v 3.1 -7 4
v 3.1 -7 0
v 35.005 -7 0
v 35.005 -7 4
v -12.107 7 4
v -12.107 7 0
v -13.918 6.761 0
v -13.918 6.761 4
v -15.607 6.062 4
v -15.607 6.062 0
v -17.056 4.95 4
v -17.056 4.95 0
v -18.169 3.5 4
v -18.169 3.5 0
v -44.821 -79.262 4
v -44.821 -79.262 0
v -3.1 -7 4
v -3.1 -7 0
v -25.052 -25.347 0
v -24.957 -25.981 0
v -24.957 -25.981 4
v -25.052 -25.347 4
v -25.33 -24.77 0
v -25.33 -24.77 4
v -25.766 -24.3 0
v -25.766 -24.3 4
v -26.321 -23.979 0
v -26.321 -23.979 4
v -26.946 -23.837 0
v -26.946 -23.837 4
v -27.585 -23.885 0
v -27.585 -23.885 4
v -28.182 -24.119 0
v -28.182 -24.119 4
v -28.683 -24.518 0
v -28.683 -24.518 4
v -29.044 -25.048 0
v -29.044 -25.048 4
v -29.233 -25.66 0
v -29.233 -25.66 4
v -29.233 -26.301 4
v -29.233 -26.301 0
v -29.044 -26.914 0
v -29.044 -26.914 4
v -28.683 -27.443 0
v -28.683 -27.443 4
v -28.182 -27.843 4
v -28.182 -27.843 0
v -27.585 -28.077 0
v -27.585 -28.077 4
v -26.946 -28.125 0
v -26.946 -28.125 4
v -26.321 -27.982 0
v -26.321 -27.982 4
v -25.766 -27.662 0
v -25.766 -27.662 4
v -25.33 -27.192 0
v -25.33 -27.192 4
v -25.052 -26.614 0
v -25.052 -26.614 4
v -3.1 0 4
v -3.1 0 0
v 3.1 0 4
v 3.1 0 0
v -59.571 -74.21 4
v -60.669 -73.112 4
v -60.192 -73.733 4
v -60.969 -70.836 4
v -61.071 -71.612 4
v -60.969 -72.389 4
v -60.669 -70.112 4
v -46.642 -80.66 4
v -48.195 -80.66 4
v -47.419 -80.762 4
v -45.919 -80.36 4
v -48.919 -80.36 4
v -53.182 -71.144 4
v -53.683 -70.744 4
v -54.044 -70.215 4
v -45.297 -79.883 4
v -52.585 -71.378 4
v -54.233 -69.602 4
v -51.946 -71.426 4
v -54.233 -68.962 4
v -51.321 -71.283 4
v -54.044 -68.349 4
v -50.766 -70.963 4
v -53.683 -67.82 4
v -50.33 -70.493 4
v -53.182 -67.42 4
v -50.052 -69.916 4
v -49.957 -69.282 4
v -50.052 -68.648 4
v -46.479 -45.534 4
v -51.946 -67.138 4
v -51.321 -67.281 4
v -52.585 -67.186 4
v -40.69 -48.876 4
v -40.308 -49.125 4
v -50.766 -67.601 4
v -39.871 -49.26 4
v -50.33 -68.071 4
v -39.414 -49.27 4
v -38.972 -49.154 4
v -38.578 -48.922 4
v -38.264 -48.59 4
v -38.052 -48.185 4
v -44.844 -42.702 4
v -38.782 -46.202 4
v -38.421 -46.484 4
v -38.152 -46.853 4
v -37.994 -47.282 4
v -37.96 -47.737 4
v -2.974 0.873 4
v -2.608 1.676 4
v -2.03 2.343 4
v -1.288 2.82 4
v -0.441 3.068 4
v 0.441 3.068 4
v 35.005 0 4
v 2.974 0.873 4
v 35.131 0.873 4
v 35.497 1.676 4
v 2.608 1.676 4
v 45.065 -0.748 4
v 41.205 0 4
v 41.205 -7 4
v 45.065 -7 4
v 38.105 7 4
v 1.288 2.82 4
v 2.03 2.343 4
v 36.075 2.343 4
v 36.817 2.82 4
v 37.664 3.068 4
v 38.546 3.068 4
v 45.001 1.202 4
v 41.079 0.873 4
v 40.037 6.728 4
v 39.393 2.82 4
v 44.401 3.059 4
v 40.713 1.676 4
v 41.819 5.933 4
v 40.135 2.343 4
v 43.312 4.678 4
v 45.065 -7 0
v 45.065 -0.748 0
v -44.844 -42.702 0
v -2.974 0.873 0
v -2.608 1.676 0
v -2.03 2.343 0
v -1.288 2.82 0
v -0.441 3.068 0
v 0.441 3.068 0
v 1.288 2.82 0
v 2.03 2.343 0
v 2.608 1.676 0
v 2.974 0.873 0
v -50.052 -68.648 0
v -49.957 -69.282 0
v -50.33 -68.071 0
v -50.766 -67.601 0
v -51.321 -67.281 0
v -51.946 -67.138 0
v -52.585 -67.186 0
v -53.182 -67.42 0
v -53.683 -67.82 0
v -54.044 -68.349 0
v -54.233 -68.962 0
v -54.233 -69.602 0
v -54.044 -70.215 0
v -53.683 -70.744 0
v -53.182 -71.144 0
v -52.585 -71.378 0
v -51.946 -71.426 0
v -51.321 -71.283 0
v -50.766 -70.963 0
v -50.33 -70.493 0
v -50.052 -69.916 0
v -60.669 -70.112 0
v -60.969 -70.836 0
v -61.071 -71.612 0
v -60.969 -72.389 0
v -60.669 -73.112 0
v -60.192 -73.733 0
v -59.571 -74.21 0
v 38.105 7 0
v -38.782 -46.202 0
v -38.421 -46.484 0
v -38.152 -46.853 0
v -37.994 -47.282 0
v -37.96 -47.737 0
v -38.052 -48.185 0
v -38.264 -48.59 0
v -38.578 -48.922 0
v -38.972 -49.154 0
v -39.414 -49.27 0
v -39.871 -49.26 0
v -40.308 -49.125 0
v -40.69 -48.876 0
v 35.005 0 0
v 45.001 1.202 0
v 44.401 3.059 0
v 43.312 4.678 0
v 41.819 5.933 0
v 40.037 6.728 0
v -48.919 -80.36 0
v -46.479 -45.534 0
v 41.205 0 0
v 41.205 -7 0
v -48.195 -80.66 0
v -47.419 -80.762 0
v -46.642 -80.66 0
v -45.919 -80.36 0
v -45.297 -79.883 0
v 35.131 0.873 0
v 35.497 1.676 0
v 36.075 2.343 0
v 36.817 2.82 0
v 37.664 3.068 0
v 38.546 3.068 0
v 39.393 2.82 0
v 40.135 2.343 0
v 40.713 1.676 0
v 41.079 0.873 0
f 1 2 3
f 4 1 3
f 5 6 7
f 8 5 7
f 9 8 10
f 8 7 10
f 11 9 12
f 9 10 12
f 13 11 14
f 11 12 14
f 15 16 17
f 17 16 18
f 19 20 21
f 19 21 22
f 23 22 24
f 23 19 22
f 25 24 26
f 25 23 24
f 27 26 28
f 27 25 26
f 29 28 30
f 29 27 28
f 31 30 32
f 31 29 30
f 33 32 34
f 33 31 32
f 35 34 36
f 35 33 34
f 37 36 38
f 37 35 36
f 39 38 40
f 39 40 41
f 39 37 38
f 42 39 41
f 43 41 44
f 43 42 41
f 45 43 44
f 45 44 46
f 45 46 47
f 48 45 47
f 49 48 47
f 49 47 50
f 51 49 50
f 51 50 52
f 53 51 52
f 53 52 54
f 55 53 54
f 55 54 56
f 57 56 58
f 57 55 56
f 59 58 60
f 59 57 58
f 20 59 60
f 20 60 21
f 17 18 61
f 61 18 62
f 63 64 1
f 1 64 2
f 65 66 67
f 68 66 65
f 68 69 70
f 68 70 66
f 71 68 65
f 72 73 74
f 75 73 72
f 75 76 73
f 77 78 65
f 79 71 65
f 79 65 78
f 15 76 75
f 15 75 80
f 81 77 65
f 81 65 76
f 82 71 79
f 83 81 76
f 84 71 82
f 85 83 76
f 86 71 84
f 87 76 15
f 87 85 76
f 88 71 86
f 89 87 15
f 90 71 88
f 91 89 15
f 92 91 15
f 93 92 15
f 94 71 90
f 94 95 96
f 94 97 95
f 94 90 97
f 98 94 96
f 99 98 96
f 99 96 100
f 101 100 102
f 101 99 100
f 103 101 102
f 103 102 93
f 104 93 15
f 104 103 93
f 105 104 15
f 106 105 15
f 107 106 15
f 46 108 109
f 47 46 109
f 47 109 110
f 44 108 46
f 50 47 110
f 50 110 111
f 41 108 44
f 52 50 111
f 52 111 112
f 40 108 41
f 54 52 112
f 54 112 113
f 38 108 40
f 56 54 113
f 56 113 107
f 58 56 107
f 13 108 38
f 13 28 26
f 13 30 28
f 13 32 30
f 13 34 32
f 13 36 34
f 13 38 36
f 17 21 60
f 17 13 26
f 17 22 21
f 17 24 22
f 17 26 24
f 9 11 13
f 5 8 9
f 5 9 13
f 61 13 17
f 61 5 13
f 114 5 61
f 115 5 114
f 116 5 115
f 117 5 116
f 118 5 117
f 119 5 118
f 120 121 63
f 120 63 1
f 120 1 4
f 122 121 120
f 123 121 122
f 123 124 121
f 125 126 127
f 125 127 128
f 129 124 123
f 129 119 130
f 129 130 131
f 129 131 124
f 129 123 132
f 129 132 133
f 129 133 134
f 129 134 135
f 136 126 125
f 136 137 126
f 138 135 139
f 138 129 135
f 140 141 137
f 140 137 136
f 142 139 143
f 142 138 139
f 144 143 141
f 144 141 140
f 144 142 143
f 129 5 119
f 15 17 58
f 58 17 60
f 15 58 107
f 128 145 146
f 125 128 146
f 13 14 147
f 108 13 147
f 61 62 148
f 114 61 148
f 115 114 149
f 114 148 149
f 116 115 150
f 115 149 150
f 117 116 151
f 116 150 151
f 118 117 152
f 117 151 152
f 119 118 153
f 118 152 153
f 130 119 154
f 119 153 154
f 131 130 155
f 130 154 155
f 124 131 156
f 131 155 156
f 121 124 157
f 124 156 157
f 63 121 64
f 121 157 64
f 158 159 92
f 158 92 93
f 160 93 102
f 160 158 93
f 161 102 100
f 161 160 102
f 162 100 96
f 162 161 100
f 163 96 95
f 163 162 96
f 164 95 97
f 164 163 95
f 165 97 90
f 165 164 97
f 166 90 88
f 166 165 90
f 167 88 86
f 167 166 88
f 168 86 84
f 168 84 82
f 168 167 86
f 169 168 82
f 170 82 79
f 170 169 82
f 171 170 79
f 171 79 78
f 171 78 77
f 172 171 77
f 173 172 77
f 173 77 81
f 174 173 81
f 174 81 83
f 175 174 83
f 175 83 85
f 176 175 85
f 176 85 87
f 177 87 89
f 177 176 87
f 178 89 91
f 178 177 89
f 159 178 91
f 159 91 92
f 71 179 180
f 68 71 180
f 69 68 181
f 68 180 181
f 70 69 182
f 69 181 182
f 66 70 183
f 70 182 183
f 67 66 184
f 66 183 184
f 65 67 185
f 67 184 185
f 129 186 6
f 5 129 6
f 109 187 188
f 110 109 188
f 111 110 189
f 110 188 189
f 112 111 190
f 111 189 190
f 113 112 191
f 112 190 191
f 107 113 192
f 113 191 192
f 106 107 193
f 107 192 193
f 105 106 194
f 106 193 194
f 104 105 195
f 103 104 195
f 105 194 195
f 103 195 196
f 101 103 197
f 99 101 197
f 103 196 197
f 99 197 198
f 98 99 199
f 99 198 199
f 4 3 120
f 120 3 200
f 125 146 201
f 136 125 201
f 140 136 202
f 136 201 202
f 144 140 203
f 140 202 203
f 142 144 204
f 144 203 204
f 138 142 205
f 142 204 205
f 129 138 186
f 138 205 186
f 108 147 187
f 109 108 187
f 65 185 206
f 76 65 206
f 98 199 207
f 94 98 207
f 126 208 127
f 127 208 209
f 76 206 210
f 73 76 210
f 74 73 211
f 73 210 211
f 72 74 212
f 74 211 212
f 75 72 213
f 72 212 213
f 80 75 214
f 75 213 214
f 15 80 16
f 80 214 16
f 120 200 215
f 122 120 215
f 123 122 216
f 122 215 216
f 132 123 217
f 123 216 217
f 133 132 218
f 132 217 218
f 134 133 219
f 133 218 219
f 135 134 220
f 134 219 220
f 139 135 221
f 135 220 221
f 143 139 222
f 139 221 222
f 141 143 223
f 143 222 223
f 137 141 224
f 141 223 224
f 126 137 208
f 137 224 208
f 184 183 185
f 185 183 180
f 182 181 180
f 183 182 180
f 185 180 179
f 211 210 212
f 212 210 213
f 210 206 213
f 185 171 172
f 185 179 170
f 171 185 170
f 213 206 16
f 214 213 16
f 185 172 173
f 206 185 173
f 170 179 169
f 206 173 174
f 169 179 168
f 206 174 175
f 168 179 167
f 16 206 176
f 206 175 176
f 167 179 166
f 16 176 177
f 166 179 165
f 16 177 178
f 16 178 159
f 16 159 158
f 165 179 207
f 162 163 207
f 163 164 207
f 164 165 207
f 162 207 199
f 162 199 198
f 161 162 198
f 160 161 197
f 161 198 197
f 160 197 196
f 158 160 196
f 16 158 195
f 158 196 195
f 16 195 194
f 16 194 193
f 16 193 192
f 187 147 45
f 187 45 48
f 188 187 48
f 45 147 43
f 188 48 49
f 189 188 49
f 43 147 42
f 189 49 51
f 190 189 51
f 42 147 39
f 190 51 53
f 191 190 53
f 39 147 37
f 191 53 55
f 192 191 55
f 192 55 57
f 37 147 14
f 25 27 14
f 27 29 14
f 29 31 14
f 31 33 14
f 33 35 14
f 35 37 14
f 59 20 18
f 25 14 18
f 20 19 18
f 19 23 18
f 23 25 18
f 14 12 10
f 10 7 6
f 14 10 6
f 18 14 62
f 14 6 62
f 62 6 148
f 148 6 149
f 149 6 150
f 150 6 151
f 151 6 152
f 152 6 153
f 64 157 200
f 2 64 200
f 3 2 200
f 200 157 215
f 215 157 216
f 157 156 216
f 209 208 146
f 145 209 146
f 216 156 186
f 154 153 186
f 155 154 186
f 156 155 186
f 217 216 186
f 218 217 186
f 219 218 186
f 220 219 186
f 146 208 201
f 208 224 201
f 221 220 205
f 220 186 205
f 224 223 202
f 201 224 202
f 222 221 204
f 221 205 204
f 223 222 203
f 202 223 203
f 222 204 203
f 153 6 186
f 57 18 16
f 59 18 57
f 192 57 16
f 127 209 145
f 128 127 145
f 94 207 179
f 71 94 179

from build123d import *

# Parameters (mm, degrees)
SKETCH1_R           = 2.15
BOSS_EXTRUDE1_DEPTH = 4


with BuildPart() as part:
    # Sketch1 → Boss-Extrude1 (new body)
    with BuildSketch(Plane.XY):
        with BuildLine():
            Line((-3.1, -7), (-3.1, 0))
            ThreePointArc((-3.1, 0), (0, 3.1), (3.1, 0))
            Line((3.1, 0), (3.1, -7))
            Line((3.1, -7), (35.005, -7))
            Line((35.005, -7), (35.005, 0))
            ThreePointArc((35.005, 0), (38.105, 3.1), (41.205, 0))
            Line((41.205, 0), (41.205, -7))
            Line((41.205, -7), (45.064925835, -7))
            Line((45.064925835, -7), (45.064925835, -0.747952118))
            ThreePointArc((45.064925835, -0.747952118), (43.312478508, 4.677837918), (38.105, 7))
            Line((38.105, 7), (-12.106664199, 7))
            ThreePointArc((-12.106664199, 7), (-15.606664199, 6.062177826), (-18.168842026, 3.5))
            Line((-18.168842026, 3.5), (-44.843842026, -42.702455292))
            Line((-44.843842026, -42.702455292), (-38.781664199, -46.202455292))
            ThreePointArc((-38.781664199, -46.202455292), (-38.263860854, -48.590239831), (-40.690427119, -48.875566784))
            Line((-40.690427119, -48.875566784), (-46.478523985, -45.5338075))
            Line((-46.478523985, -45.5338075), (-60.668842026, -70.112159322))
            ThreePointArc((-60.668842026, -70.112159322), (-60.968543293, -72.388616457), (-59.570765814, -74.210235533))
            Line((-59.570765814, -74.210235533), (-48.918653348, -80.360235533))
            ThreePointArc((-48.918653348, -80.360235533), (-46.642196213, -80.659936801), (-44.820577137, -79.262159322))
            Line((-44.820577137, -79.262159322), (-3.1, -7))
        make_face()
        with Locations((-52.106664199, -69.282032303)):
            Circle(SKETCH1_R, mode=Mode.SUBTRACT)
        with Locations((-27.106664199, -25.980762114)):
            Circle(SKETCH1_R, mode=Mode.SUBTRACT)
    extrude(amount=BOSS_EXTRUDE1_DEPTH)


solid = part.part
